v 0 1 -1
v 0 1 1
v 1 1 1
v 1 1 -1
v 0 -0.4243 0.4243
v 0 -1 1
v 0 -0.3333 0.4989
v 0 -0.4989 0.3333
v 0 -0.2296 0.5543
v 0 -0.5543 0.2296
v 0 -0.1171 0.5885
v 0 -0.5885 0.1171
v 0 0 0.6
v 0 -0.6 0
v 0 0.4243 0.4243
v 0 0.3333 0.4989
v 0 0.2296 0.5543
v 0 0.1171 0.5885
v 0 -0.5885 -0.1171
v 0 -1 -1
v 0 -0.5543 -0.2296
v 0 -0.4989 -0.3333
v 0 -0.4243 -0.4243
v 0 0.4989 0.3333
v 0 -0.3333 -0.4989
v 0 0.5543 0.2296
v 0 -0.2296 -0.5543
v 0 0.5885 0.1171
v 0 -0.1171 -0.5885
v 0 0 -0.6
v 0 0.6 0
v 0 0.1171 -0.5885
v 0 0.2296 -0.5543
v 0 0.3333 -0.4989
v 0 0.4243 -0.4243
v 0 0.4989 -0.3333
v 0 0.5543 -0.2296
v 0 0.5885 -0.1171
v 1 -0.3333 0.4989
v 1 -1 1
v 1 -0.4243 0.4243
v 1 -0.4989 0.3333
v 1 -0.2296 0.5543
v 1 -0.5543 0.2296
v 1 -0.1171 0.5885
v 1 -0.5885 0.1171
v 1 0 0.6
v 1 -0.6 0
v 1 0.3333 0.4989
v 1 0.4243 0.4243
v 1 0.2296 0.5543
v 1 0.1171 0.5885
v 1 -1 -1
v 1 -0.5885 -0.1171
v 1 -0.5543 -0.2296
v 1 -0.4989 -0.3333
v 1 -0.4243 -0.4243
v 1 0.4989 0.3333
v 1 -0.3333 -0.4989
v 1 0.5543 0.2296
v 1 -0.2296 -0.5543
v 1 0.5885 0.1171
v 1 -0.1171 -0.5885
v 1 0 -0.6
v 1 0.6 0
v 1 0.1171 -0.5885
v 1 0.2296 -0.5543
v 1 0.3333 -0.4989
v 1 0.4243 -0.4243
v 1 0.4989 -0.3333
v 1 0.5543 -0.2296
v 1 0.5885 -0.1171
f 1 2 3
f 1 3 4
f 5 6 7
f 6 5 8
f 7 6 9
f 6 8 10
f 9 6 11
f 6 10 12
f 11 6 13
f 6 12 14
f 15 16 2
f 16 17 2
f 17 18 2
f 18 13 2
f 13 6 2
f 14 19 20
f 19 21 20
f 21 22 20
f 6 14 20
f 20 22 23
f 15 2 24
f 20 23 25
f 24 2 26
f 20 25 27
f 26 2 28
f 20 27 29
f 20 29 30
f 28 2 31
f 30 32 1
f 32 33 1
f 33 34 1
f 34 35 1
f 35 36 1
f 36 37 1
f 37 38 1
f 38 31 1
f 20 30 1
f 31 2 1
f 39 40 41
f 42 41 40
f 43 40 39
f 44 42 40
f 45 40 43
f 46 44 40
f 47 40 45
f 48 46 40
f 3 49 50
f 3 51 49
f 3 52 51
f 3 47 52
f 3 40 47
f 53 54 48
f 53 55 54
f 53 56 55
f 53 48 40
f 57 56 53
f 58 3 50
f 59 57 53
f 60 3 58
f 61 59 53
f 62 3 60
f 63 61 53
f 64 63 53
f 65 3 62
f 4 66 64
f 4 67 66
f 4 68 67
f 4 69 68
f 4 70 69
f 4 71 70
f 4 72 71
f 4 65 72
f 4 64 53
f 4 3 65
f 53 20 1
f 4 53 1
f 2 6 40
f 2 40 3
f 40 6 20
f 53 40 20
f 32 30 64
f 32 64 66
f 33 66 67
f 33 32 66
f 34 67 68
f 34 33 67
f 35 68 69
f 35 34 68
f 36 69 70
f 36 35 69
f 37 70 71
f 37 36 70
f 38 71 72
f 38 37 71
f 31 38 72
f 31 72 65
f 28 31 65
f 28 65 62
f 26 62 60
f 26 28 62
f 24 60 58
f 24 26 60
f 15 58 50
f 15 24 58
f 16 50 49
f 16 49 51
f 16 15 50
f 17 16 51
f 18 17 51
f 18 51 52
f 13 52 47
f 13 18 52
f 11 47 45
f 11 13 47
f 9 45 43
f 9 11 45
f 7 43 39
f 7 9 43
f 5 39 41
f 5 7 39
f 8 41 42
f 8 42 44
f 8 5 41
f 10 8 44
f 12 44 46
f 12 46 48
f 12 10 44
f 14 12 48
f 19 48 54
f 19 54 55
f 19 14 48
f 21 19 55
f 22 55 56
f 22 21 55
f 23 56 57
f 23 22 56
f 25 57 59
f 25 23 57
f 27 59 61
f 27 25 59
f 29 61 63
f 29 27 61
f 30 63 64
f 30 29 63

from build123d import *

# Parameters (mm, degrees)
SKETCH_1_W      = 2
SKETCH_1_H      = 2
SKETCH_1_R      = 0.6
EXTRUDE_2_DEPTH = 1


with BuildPart() as part:
    # 草图1 → 凸台-拉伸2 (new body)
    with BuildSketch(Plane(origin=(0, 0, 0), x_dir=(0, 0, -1), z_dir=(1, 0, 0))):
        Rectangle(SKETCH_1_W, SKETCH_1_H)
        Circle(SKETCH_1_R, mode=Mode.SUBTRACT)
    extrude(amount=EXTRUDE_2_DEPTH)


solid = part.part
